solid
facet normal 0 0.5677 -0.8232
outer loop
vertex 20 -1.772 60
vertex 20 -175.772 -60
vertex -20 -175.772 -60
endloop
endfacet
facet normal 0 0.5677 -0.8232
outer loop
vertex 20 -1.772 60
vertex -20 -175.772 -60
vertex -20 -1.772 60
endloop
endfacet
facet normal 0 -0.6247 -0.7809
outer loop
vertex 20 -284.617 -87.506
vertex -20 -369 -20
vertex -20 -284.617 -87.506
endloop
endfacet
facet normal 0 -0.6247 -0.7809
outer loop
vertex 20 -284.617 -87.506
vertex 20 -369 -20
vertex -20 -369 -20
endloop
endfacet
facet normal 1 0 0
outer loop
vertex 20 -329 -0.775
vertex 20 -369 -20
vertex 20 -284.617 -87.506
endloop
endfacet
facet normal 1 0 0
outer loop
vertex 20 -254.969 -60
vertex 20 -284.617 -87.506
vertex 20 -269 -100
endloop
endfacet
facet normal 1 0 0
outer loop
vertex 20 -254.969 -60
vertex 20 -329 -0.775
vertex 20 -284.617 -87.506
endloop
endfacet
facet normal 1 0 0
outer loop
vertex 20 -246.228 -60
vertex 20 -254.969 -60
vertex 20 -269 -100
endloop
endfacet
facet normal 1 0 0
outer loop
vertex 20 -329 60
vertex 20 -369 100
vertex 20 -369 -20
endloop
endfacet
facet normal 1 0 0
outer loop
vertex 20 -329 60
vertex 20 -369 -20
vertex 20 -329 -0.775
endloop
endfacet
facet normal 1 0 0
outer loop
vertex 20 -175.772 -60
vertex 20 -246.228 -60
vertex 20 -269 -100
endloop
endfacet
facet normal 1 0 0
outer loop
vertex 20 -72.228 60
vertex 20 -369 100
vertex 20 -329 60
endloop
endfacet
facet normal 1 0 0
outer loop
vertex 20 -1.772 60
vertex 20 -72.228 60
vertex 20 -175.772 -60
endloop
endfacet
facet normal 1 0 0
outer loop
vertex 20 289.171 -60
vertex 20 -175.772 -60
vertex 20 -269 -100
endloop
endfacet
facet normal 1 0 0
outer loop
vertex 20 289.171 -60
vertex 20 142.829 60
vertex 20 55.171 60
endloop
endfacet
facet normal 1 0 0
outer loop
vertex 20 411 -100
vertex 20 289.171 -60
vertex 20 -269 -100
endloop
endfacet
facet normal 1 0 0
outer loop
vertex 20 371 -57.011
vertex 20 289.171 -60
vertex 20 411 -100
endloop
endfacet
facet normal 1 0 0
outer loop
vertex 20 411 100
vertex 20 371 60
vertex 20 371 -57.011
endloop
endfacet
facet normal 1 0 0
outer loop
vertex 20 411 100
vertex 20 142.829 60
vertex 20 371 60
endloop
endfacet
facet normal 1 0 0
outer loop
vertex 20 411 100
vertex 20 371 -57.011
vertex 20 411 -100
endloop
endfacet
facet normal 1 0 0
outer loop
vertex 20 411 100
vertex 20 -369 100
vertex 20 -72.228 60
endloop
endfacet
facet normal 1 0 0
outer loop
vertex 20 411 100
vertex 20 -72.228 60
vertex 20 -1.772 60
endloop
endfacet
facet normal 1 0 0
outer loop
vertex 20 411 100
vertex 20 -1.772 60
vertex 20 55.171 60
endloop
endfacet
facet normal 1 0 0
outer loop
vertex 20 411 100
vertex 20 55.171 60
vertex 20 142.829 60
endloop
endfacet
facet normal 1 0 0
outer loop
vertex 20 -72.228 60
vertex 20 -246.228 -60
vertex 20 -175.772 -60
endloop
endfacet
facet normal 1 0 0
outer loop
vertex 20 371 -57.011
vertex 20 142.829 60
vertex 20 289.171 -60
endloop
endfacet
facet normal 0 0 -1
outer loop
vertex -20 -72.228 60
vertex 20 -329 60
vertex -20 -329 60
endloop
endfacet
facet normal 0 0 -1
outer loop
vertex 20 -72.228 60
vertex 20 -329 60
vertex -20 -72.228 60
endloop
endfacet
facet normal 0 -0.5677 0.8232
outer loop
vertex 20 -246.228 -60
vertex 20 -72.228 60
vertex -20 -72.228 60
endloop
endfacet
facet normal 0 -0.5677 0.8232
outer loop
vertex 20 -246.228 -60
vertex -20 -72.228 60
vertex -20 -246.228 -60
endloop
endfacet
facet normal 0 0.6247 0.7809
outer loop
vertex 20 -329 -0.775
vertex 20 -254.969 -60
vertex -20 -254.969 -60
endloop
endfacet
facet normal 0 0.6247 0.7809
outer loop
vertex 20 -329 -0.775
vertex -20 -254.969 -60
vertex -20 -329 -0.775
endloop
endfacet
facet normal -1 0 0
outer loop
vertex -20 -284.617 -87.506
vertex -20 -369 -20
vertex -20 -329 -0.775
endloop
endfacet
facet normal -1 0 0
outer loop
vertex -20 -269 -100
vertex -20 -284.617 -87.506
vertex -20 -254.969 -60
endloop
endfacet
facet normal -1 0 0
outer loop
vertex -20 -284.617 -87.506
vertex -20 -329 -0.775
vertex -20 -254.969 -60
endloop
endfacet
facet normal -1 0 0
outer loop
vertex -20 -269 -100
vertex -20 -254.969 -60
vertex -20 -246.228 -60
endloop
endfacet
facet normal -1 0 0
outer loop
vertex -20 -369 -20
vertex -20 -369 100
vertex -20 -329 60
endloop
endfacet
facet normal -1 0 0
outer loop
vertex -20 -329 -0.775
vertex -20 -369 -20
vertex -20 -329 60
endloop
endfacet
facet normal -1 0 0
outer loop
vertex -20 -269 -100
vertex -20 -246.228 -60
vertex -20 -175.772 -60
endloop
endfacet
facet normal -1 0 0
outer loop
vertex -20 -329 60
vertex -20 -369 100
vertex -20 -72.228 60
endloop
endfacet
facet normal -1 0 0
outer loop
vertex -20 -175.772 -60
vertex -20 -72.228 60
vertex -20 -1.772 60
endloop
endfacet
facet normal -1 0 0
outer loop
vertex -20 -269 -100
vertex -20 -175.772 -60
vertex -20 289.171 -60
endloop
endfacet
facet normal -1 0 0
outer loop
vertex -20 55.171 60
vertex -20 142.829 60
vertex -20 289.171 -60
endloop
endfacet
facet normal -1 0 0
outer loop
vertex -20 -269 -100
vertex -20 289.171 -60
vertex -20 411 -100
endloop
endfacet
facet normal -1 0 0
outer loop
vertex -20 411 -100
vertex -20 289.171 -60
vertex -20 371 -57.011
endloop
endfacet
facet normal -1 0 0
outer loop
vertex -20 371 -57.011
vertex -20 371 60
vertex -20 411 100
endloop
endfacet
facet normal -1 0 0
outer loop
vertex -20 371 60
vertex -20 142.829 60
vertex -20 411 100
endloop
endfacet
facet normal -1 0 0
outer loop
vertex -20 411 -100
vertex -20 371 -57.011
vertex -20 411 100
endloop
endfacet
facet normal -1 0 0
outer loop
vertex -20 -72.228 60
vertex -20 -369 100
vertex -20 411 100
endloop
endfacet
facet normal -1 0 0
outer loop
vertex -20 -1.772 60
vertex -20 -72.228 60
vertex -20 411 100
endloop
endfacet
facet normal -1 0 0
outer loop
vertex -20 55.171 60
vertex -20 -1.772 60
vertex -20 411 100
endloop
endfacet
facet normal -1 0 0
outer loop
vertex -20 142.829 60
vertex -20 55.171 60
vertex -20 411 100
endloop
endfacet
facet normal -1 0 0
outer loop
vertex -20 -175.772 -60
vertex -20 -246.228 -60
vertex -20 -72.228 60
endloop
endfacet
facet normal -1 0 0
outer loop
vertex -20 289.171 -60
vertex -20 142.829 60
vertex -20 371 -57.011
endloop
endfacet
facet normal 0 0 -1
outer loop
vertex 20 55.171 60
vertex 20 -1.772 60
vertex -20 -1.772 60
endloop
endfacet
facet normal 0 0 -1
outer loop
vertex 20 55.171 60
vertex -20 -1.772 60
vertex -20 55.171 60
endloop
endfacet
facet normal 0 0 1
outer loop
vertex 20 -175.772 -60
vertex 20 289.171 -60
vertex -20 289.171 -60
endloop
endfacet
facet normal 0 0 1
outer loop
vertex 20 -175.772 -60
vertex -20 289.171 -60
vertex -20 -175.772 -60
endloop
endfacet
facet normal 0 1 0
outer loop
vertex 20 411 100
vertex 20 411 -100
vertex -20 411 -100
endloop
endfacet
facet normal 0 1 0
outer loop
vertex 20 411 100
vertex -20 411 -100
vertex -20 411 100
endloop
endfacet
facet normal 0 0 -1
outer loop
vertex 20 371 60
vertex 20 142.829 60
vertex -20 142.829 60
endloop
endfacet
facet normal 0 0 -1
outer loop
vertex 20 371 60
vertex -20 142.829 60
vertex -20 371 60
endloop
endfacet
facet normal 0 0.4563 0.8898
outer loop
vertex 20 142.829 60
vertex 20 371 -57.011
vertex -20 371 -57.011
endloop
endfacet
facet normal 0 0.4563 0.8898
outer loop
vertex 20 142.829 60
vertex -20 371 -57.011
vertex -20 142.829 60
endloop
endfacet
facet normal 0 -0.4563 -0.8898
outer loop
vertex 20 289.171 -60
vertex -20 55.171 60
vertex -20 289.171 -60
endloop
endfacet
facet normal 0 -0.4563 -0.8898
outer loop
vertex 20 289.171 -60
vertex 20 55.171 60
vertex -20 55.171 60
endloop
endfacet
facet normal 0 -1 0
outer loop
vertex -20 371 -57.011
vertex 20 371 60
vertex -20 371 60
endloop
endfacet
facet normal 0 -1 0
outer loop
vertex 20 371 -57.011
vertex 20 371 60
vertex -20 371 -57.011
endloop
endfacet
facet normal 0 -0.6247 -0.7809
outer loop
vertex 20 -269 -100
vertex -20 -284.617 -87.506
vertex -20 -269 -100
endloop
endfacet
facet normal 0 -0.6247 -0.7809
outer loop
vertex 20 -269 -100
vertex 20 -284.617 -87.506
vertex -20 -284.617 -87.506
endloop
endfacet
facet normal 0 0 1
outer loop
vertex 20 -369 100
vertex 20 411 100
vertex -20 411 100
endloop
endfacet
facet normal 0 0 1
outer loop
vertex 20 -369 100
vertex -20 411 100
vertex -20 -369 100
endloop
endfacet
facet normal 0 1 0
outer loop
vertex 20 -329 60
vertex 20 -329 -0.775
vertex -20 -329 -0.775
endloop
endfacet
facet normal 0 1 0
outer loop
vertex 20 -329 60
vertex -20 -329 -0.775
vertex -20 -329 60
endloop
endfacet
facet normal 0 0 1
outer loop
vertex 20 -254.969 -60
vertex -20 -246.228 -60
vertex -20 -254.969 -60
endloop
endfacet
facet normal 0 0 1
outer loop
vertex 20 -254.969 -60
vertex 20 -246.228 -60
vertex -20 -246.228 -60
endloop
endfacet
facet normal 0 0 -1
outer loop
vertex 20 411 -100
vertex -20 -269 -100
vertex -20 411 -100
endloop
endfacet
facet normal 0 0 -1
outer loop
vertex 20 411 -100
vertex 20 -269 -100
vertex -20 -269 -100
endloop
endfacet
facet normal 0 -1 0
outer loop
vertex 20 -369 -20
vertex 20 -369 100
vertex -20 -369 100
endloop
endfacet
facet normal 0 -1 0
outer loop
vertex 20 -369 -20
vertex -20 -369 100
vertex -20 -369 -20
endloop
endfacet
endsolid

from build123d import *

# Parameters (mm, degrees)
F1_DEPTH = 20


with BuildPart() as f1:
    # F0 (on Right) → F1 (new body, symmetric)
    with BuildSketch(Plane.YZ):
        with BuildLine():
            Line((-304.9687541528, -20), (-368.9999965272, -20))
            Line((-368.9999965272, -20), (-284.617372716, -87.5060990489))
            ThreePointArc((-284.617372716, -87.5060990489), (-282.6313428058, -85.3648915743), (-280.3546556432, -83.5357442817))
            Line((-280.3546556432, -83.5357442817), (-246.2278264348, -60))
            Line((-246.2278264348, -60), (-254.9687541528, -60))
            Line((-254.9687541528, -60), (-304.9687541528, -20))
        make_face()
        Polygon((-175.7721666195, -60), (-233.7721666195, -100), (367.1707894712, -100), (289.1707894712, -60), align=None)
        Polygon((411.0000034728, 100), (64.8292174745, 100), (142.8292174745, 60), (371.0000034728, 60), (371.0000034728, -57.0106594863), (411.0000034728, -77.5234799992), align=None)
        with BuildLine():
            Line((64.8292174745, 100), (41.0000034728, 100))
            ThreePointArc((41.0000034728, 100), (40.4412866754, 95.3056941474), (38.7963527291, 90.8736670481))
            Line((38.7963527291, 90.8736670481), (99.0000034728, 60))
            Line((99.0000034728, 60), (142.8292174745, 60))
            Line((142.8292174745, 60), (64.8292174745, 100))
        make_face()
        with BuildLine():
            Line((99.0000034728, 60), (38.7963527291, 90.8736670481))
            ThreePointArc((38.7963527291, 90.8736670481), (36.0301930895, 86.8055541955), (32.3546625889, 83.5357442817))
            Line((32.3546625889, 83.5357442817), (22.5123293603, 76.747928262))
            Line((22.5123293603, 76.747928262), (55.1707894712, 60))
            Line((55.1707894712, 60), (99.0000034728, 60))
        make_face()
        Polygon((22.5123293603, 76.747928262), (-1.7721666195, 60), (55.1707894712, 60), align=None)
        with BuildLine():
            ThreePointArc((11.8736705209, 82.2036507437), (7.8055576683, 84.9698103834), (4.5357477545, 88.6453408839))
            Line((4.5357477545, 88.6453408839), (-36.9999965272, 60))
            Line((-36.9999965272, 60), (-1.7721666195, 60))
            Line((-1.7721666195, 60), (22.5123293603, 76.747928262))
            Line((22.5123293603, 76.747928262), (11.8736705209, 82.2036507437))
        make_face()
        with BuildLine():
            Line((1.0000034728, 100), (-14.2278264348, 100))
            Line((-14.2278264348, 100), (-72.2278264348, 60))
            Line((-72.2278264348, 60), (-36.9999965272, 60))
            Line((-36.9999965272, 60), (4.5357477545, 88.6453408839))
            ThreePointArc((4.5357477545, 88.6453408839), (1.9043872957, 94.0537875234), (1.0000034728, 100))
        make_face()
        with BuildLine():
            Line((21.0000034728, 100), (1.0000034728, 100))
            ThreePointArc((1.0000034728, 100), (1.9043872957, 94.0537875234), (4.5357477545, 88.6453408839))
            Line((4.5357477545, 88.6453408839), (21.0000034728, 100))
        make_face()
        with BuildLine():
            Line((38.7963527291, 90.8736670481), (21.0000034728, 100))
            Line((21.0000034728, 100), (4.5357477545, 88.6453408839))
            ThreePointArc((4.5357477545, 88.6453408839), (7.8055576683, 84.9698103834), (11.8736705209, 82.2036507437))
            Line((11.8736705209, 82.2036507437), (22.5123293603, 76.747928262))
            Line((22.5123293603, 76.747928262), (32.3546625889, 83.5357442817))
            ThreePointArc((32.3546625889, 83.5357442817), (36.0301930895, 86.8055541955), (38.7963527291, 90.8736670481))
        make_face()
        with BuildLine():
            Line((41.0000034728, 100), (21.0000034728, 100))
            Line((21.0000034728, 100), (38.7963527291, 90.8736670481))
            ThreePointArc((38.7963527291, 90.8736670481), (40.4412866754, 95.3056941474), (41.0000034728, 100))
        make_face()
        Polygon((-368.9999965272, 100), (-368.9999965272, 0), (-368.9999965272, -20), (-304.9687541528, -20), (-328.9999965272, -0.7750061005), (-328.9999965272, 60), (-72.2278264348, 60), (-14.2278264348, 100), align=None)
        Polygon((-210.9999965272, -60), (-268.9999965272, -100), (-233.7721666195, -100), (-175.7721666195, -60), align=None)
        with BuildLine():
            ThreePointArc((-280.3546556432, -83.5357442817), (-282.6313428058, -85.3648915743), (-284.617372716, -87.5060990489))
            Line((-284.617372716, -87.5060990489), (-268.9999965272, -100))
            Line((-268.9999965272, -100), (-210.9999965272, -60))
            Line((-210.9999965272, -60), (-246.2278264348, -60))
            Line((-246.2278264348, -60), (-280.3546556432, -83.5357442817))
        make_face()
        Polygon((-36.9999965272, 60), (-72.2278264348, 60), (-246.2278264348, -60), (-210.9999965272, -60), align=None)
        Polygon((-36.9999965272, 60), (-210.9999965272, -60), (-175.7721666195, -60), (-1.7721666195, 60), align=None)
        Polygon((55.1707894712, 60), (289.1707894712, -60), (333.0000034728, -60), (99.0000034728, 60), align=None)
        Polygon((142.8292174745, 60), (99.0000034728, 60), (333.0000034728, -60), (371.0000034728, -60), (371.0000034728, -57.0106594863), align=None)
        Polygon((289.1707894712, -60), (367.1707894712, -100), (411.0000034728, -100), (333.0000034728, -60), align=None)
        Polygon((333.0000034728, -60), (411.0000034728, -100), (411.0000034728, -77.5234799992), (371.0000034728, -57.0106594863), (371.0000034728, -60), align=None)
    extrude(amount=F1_DEPTH, both=True)


solid = f1.part
